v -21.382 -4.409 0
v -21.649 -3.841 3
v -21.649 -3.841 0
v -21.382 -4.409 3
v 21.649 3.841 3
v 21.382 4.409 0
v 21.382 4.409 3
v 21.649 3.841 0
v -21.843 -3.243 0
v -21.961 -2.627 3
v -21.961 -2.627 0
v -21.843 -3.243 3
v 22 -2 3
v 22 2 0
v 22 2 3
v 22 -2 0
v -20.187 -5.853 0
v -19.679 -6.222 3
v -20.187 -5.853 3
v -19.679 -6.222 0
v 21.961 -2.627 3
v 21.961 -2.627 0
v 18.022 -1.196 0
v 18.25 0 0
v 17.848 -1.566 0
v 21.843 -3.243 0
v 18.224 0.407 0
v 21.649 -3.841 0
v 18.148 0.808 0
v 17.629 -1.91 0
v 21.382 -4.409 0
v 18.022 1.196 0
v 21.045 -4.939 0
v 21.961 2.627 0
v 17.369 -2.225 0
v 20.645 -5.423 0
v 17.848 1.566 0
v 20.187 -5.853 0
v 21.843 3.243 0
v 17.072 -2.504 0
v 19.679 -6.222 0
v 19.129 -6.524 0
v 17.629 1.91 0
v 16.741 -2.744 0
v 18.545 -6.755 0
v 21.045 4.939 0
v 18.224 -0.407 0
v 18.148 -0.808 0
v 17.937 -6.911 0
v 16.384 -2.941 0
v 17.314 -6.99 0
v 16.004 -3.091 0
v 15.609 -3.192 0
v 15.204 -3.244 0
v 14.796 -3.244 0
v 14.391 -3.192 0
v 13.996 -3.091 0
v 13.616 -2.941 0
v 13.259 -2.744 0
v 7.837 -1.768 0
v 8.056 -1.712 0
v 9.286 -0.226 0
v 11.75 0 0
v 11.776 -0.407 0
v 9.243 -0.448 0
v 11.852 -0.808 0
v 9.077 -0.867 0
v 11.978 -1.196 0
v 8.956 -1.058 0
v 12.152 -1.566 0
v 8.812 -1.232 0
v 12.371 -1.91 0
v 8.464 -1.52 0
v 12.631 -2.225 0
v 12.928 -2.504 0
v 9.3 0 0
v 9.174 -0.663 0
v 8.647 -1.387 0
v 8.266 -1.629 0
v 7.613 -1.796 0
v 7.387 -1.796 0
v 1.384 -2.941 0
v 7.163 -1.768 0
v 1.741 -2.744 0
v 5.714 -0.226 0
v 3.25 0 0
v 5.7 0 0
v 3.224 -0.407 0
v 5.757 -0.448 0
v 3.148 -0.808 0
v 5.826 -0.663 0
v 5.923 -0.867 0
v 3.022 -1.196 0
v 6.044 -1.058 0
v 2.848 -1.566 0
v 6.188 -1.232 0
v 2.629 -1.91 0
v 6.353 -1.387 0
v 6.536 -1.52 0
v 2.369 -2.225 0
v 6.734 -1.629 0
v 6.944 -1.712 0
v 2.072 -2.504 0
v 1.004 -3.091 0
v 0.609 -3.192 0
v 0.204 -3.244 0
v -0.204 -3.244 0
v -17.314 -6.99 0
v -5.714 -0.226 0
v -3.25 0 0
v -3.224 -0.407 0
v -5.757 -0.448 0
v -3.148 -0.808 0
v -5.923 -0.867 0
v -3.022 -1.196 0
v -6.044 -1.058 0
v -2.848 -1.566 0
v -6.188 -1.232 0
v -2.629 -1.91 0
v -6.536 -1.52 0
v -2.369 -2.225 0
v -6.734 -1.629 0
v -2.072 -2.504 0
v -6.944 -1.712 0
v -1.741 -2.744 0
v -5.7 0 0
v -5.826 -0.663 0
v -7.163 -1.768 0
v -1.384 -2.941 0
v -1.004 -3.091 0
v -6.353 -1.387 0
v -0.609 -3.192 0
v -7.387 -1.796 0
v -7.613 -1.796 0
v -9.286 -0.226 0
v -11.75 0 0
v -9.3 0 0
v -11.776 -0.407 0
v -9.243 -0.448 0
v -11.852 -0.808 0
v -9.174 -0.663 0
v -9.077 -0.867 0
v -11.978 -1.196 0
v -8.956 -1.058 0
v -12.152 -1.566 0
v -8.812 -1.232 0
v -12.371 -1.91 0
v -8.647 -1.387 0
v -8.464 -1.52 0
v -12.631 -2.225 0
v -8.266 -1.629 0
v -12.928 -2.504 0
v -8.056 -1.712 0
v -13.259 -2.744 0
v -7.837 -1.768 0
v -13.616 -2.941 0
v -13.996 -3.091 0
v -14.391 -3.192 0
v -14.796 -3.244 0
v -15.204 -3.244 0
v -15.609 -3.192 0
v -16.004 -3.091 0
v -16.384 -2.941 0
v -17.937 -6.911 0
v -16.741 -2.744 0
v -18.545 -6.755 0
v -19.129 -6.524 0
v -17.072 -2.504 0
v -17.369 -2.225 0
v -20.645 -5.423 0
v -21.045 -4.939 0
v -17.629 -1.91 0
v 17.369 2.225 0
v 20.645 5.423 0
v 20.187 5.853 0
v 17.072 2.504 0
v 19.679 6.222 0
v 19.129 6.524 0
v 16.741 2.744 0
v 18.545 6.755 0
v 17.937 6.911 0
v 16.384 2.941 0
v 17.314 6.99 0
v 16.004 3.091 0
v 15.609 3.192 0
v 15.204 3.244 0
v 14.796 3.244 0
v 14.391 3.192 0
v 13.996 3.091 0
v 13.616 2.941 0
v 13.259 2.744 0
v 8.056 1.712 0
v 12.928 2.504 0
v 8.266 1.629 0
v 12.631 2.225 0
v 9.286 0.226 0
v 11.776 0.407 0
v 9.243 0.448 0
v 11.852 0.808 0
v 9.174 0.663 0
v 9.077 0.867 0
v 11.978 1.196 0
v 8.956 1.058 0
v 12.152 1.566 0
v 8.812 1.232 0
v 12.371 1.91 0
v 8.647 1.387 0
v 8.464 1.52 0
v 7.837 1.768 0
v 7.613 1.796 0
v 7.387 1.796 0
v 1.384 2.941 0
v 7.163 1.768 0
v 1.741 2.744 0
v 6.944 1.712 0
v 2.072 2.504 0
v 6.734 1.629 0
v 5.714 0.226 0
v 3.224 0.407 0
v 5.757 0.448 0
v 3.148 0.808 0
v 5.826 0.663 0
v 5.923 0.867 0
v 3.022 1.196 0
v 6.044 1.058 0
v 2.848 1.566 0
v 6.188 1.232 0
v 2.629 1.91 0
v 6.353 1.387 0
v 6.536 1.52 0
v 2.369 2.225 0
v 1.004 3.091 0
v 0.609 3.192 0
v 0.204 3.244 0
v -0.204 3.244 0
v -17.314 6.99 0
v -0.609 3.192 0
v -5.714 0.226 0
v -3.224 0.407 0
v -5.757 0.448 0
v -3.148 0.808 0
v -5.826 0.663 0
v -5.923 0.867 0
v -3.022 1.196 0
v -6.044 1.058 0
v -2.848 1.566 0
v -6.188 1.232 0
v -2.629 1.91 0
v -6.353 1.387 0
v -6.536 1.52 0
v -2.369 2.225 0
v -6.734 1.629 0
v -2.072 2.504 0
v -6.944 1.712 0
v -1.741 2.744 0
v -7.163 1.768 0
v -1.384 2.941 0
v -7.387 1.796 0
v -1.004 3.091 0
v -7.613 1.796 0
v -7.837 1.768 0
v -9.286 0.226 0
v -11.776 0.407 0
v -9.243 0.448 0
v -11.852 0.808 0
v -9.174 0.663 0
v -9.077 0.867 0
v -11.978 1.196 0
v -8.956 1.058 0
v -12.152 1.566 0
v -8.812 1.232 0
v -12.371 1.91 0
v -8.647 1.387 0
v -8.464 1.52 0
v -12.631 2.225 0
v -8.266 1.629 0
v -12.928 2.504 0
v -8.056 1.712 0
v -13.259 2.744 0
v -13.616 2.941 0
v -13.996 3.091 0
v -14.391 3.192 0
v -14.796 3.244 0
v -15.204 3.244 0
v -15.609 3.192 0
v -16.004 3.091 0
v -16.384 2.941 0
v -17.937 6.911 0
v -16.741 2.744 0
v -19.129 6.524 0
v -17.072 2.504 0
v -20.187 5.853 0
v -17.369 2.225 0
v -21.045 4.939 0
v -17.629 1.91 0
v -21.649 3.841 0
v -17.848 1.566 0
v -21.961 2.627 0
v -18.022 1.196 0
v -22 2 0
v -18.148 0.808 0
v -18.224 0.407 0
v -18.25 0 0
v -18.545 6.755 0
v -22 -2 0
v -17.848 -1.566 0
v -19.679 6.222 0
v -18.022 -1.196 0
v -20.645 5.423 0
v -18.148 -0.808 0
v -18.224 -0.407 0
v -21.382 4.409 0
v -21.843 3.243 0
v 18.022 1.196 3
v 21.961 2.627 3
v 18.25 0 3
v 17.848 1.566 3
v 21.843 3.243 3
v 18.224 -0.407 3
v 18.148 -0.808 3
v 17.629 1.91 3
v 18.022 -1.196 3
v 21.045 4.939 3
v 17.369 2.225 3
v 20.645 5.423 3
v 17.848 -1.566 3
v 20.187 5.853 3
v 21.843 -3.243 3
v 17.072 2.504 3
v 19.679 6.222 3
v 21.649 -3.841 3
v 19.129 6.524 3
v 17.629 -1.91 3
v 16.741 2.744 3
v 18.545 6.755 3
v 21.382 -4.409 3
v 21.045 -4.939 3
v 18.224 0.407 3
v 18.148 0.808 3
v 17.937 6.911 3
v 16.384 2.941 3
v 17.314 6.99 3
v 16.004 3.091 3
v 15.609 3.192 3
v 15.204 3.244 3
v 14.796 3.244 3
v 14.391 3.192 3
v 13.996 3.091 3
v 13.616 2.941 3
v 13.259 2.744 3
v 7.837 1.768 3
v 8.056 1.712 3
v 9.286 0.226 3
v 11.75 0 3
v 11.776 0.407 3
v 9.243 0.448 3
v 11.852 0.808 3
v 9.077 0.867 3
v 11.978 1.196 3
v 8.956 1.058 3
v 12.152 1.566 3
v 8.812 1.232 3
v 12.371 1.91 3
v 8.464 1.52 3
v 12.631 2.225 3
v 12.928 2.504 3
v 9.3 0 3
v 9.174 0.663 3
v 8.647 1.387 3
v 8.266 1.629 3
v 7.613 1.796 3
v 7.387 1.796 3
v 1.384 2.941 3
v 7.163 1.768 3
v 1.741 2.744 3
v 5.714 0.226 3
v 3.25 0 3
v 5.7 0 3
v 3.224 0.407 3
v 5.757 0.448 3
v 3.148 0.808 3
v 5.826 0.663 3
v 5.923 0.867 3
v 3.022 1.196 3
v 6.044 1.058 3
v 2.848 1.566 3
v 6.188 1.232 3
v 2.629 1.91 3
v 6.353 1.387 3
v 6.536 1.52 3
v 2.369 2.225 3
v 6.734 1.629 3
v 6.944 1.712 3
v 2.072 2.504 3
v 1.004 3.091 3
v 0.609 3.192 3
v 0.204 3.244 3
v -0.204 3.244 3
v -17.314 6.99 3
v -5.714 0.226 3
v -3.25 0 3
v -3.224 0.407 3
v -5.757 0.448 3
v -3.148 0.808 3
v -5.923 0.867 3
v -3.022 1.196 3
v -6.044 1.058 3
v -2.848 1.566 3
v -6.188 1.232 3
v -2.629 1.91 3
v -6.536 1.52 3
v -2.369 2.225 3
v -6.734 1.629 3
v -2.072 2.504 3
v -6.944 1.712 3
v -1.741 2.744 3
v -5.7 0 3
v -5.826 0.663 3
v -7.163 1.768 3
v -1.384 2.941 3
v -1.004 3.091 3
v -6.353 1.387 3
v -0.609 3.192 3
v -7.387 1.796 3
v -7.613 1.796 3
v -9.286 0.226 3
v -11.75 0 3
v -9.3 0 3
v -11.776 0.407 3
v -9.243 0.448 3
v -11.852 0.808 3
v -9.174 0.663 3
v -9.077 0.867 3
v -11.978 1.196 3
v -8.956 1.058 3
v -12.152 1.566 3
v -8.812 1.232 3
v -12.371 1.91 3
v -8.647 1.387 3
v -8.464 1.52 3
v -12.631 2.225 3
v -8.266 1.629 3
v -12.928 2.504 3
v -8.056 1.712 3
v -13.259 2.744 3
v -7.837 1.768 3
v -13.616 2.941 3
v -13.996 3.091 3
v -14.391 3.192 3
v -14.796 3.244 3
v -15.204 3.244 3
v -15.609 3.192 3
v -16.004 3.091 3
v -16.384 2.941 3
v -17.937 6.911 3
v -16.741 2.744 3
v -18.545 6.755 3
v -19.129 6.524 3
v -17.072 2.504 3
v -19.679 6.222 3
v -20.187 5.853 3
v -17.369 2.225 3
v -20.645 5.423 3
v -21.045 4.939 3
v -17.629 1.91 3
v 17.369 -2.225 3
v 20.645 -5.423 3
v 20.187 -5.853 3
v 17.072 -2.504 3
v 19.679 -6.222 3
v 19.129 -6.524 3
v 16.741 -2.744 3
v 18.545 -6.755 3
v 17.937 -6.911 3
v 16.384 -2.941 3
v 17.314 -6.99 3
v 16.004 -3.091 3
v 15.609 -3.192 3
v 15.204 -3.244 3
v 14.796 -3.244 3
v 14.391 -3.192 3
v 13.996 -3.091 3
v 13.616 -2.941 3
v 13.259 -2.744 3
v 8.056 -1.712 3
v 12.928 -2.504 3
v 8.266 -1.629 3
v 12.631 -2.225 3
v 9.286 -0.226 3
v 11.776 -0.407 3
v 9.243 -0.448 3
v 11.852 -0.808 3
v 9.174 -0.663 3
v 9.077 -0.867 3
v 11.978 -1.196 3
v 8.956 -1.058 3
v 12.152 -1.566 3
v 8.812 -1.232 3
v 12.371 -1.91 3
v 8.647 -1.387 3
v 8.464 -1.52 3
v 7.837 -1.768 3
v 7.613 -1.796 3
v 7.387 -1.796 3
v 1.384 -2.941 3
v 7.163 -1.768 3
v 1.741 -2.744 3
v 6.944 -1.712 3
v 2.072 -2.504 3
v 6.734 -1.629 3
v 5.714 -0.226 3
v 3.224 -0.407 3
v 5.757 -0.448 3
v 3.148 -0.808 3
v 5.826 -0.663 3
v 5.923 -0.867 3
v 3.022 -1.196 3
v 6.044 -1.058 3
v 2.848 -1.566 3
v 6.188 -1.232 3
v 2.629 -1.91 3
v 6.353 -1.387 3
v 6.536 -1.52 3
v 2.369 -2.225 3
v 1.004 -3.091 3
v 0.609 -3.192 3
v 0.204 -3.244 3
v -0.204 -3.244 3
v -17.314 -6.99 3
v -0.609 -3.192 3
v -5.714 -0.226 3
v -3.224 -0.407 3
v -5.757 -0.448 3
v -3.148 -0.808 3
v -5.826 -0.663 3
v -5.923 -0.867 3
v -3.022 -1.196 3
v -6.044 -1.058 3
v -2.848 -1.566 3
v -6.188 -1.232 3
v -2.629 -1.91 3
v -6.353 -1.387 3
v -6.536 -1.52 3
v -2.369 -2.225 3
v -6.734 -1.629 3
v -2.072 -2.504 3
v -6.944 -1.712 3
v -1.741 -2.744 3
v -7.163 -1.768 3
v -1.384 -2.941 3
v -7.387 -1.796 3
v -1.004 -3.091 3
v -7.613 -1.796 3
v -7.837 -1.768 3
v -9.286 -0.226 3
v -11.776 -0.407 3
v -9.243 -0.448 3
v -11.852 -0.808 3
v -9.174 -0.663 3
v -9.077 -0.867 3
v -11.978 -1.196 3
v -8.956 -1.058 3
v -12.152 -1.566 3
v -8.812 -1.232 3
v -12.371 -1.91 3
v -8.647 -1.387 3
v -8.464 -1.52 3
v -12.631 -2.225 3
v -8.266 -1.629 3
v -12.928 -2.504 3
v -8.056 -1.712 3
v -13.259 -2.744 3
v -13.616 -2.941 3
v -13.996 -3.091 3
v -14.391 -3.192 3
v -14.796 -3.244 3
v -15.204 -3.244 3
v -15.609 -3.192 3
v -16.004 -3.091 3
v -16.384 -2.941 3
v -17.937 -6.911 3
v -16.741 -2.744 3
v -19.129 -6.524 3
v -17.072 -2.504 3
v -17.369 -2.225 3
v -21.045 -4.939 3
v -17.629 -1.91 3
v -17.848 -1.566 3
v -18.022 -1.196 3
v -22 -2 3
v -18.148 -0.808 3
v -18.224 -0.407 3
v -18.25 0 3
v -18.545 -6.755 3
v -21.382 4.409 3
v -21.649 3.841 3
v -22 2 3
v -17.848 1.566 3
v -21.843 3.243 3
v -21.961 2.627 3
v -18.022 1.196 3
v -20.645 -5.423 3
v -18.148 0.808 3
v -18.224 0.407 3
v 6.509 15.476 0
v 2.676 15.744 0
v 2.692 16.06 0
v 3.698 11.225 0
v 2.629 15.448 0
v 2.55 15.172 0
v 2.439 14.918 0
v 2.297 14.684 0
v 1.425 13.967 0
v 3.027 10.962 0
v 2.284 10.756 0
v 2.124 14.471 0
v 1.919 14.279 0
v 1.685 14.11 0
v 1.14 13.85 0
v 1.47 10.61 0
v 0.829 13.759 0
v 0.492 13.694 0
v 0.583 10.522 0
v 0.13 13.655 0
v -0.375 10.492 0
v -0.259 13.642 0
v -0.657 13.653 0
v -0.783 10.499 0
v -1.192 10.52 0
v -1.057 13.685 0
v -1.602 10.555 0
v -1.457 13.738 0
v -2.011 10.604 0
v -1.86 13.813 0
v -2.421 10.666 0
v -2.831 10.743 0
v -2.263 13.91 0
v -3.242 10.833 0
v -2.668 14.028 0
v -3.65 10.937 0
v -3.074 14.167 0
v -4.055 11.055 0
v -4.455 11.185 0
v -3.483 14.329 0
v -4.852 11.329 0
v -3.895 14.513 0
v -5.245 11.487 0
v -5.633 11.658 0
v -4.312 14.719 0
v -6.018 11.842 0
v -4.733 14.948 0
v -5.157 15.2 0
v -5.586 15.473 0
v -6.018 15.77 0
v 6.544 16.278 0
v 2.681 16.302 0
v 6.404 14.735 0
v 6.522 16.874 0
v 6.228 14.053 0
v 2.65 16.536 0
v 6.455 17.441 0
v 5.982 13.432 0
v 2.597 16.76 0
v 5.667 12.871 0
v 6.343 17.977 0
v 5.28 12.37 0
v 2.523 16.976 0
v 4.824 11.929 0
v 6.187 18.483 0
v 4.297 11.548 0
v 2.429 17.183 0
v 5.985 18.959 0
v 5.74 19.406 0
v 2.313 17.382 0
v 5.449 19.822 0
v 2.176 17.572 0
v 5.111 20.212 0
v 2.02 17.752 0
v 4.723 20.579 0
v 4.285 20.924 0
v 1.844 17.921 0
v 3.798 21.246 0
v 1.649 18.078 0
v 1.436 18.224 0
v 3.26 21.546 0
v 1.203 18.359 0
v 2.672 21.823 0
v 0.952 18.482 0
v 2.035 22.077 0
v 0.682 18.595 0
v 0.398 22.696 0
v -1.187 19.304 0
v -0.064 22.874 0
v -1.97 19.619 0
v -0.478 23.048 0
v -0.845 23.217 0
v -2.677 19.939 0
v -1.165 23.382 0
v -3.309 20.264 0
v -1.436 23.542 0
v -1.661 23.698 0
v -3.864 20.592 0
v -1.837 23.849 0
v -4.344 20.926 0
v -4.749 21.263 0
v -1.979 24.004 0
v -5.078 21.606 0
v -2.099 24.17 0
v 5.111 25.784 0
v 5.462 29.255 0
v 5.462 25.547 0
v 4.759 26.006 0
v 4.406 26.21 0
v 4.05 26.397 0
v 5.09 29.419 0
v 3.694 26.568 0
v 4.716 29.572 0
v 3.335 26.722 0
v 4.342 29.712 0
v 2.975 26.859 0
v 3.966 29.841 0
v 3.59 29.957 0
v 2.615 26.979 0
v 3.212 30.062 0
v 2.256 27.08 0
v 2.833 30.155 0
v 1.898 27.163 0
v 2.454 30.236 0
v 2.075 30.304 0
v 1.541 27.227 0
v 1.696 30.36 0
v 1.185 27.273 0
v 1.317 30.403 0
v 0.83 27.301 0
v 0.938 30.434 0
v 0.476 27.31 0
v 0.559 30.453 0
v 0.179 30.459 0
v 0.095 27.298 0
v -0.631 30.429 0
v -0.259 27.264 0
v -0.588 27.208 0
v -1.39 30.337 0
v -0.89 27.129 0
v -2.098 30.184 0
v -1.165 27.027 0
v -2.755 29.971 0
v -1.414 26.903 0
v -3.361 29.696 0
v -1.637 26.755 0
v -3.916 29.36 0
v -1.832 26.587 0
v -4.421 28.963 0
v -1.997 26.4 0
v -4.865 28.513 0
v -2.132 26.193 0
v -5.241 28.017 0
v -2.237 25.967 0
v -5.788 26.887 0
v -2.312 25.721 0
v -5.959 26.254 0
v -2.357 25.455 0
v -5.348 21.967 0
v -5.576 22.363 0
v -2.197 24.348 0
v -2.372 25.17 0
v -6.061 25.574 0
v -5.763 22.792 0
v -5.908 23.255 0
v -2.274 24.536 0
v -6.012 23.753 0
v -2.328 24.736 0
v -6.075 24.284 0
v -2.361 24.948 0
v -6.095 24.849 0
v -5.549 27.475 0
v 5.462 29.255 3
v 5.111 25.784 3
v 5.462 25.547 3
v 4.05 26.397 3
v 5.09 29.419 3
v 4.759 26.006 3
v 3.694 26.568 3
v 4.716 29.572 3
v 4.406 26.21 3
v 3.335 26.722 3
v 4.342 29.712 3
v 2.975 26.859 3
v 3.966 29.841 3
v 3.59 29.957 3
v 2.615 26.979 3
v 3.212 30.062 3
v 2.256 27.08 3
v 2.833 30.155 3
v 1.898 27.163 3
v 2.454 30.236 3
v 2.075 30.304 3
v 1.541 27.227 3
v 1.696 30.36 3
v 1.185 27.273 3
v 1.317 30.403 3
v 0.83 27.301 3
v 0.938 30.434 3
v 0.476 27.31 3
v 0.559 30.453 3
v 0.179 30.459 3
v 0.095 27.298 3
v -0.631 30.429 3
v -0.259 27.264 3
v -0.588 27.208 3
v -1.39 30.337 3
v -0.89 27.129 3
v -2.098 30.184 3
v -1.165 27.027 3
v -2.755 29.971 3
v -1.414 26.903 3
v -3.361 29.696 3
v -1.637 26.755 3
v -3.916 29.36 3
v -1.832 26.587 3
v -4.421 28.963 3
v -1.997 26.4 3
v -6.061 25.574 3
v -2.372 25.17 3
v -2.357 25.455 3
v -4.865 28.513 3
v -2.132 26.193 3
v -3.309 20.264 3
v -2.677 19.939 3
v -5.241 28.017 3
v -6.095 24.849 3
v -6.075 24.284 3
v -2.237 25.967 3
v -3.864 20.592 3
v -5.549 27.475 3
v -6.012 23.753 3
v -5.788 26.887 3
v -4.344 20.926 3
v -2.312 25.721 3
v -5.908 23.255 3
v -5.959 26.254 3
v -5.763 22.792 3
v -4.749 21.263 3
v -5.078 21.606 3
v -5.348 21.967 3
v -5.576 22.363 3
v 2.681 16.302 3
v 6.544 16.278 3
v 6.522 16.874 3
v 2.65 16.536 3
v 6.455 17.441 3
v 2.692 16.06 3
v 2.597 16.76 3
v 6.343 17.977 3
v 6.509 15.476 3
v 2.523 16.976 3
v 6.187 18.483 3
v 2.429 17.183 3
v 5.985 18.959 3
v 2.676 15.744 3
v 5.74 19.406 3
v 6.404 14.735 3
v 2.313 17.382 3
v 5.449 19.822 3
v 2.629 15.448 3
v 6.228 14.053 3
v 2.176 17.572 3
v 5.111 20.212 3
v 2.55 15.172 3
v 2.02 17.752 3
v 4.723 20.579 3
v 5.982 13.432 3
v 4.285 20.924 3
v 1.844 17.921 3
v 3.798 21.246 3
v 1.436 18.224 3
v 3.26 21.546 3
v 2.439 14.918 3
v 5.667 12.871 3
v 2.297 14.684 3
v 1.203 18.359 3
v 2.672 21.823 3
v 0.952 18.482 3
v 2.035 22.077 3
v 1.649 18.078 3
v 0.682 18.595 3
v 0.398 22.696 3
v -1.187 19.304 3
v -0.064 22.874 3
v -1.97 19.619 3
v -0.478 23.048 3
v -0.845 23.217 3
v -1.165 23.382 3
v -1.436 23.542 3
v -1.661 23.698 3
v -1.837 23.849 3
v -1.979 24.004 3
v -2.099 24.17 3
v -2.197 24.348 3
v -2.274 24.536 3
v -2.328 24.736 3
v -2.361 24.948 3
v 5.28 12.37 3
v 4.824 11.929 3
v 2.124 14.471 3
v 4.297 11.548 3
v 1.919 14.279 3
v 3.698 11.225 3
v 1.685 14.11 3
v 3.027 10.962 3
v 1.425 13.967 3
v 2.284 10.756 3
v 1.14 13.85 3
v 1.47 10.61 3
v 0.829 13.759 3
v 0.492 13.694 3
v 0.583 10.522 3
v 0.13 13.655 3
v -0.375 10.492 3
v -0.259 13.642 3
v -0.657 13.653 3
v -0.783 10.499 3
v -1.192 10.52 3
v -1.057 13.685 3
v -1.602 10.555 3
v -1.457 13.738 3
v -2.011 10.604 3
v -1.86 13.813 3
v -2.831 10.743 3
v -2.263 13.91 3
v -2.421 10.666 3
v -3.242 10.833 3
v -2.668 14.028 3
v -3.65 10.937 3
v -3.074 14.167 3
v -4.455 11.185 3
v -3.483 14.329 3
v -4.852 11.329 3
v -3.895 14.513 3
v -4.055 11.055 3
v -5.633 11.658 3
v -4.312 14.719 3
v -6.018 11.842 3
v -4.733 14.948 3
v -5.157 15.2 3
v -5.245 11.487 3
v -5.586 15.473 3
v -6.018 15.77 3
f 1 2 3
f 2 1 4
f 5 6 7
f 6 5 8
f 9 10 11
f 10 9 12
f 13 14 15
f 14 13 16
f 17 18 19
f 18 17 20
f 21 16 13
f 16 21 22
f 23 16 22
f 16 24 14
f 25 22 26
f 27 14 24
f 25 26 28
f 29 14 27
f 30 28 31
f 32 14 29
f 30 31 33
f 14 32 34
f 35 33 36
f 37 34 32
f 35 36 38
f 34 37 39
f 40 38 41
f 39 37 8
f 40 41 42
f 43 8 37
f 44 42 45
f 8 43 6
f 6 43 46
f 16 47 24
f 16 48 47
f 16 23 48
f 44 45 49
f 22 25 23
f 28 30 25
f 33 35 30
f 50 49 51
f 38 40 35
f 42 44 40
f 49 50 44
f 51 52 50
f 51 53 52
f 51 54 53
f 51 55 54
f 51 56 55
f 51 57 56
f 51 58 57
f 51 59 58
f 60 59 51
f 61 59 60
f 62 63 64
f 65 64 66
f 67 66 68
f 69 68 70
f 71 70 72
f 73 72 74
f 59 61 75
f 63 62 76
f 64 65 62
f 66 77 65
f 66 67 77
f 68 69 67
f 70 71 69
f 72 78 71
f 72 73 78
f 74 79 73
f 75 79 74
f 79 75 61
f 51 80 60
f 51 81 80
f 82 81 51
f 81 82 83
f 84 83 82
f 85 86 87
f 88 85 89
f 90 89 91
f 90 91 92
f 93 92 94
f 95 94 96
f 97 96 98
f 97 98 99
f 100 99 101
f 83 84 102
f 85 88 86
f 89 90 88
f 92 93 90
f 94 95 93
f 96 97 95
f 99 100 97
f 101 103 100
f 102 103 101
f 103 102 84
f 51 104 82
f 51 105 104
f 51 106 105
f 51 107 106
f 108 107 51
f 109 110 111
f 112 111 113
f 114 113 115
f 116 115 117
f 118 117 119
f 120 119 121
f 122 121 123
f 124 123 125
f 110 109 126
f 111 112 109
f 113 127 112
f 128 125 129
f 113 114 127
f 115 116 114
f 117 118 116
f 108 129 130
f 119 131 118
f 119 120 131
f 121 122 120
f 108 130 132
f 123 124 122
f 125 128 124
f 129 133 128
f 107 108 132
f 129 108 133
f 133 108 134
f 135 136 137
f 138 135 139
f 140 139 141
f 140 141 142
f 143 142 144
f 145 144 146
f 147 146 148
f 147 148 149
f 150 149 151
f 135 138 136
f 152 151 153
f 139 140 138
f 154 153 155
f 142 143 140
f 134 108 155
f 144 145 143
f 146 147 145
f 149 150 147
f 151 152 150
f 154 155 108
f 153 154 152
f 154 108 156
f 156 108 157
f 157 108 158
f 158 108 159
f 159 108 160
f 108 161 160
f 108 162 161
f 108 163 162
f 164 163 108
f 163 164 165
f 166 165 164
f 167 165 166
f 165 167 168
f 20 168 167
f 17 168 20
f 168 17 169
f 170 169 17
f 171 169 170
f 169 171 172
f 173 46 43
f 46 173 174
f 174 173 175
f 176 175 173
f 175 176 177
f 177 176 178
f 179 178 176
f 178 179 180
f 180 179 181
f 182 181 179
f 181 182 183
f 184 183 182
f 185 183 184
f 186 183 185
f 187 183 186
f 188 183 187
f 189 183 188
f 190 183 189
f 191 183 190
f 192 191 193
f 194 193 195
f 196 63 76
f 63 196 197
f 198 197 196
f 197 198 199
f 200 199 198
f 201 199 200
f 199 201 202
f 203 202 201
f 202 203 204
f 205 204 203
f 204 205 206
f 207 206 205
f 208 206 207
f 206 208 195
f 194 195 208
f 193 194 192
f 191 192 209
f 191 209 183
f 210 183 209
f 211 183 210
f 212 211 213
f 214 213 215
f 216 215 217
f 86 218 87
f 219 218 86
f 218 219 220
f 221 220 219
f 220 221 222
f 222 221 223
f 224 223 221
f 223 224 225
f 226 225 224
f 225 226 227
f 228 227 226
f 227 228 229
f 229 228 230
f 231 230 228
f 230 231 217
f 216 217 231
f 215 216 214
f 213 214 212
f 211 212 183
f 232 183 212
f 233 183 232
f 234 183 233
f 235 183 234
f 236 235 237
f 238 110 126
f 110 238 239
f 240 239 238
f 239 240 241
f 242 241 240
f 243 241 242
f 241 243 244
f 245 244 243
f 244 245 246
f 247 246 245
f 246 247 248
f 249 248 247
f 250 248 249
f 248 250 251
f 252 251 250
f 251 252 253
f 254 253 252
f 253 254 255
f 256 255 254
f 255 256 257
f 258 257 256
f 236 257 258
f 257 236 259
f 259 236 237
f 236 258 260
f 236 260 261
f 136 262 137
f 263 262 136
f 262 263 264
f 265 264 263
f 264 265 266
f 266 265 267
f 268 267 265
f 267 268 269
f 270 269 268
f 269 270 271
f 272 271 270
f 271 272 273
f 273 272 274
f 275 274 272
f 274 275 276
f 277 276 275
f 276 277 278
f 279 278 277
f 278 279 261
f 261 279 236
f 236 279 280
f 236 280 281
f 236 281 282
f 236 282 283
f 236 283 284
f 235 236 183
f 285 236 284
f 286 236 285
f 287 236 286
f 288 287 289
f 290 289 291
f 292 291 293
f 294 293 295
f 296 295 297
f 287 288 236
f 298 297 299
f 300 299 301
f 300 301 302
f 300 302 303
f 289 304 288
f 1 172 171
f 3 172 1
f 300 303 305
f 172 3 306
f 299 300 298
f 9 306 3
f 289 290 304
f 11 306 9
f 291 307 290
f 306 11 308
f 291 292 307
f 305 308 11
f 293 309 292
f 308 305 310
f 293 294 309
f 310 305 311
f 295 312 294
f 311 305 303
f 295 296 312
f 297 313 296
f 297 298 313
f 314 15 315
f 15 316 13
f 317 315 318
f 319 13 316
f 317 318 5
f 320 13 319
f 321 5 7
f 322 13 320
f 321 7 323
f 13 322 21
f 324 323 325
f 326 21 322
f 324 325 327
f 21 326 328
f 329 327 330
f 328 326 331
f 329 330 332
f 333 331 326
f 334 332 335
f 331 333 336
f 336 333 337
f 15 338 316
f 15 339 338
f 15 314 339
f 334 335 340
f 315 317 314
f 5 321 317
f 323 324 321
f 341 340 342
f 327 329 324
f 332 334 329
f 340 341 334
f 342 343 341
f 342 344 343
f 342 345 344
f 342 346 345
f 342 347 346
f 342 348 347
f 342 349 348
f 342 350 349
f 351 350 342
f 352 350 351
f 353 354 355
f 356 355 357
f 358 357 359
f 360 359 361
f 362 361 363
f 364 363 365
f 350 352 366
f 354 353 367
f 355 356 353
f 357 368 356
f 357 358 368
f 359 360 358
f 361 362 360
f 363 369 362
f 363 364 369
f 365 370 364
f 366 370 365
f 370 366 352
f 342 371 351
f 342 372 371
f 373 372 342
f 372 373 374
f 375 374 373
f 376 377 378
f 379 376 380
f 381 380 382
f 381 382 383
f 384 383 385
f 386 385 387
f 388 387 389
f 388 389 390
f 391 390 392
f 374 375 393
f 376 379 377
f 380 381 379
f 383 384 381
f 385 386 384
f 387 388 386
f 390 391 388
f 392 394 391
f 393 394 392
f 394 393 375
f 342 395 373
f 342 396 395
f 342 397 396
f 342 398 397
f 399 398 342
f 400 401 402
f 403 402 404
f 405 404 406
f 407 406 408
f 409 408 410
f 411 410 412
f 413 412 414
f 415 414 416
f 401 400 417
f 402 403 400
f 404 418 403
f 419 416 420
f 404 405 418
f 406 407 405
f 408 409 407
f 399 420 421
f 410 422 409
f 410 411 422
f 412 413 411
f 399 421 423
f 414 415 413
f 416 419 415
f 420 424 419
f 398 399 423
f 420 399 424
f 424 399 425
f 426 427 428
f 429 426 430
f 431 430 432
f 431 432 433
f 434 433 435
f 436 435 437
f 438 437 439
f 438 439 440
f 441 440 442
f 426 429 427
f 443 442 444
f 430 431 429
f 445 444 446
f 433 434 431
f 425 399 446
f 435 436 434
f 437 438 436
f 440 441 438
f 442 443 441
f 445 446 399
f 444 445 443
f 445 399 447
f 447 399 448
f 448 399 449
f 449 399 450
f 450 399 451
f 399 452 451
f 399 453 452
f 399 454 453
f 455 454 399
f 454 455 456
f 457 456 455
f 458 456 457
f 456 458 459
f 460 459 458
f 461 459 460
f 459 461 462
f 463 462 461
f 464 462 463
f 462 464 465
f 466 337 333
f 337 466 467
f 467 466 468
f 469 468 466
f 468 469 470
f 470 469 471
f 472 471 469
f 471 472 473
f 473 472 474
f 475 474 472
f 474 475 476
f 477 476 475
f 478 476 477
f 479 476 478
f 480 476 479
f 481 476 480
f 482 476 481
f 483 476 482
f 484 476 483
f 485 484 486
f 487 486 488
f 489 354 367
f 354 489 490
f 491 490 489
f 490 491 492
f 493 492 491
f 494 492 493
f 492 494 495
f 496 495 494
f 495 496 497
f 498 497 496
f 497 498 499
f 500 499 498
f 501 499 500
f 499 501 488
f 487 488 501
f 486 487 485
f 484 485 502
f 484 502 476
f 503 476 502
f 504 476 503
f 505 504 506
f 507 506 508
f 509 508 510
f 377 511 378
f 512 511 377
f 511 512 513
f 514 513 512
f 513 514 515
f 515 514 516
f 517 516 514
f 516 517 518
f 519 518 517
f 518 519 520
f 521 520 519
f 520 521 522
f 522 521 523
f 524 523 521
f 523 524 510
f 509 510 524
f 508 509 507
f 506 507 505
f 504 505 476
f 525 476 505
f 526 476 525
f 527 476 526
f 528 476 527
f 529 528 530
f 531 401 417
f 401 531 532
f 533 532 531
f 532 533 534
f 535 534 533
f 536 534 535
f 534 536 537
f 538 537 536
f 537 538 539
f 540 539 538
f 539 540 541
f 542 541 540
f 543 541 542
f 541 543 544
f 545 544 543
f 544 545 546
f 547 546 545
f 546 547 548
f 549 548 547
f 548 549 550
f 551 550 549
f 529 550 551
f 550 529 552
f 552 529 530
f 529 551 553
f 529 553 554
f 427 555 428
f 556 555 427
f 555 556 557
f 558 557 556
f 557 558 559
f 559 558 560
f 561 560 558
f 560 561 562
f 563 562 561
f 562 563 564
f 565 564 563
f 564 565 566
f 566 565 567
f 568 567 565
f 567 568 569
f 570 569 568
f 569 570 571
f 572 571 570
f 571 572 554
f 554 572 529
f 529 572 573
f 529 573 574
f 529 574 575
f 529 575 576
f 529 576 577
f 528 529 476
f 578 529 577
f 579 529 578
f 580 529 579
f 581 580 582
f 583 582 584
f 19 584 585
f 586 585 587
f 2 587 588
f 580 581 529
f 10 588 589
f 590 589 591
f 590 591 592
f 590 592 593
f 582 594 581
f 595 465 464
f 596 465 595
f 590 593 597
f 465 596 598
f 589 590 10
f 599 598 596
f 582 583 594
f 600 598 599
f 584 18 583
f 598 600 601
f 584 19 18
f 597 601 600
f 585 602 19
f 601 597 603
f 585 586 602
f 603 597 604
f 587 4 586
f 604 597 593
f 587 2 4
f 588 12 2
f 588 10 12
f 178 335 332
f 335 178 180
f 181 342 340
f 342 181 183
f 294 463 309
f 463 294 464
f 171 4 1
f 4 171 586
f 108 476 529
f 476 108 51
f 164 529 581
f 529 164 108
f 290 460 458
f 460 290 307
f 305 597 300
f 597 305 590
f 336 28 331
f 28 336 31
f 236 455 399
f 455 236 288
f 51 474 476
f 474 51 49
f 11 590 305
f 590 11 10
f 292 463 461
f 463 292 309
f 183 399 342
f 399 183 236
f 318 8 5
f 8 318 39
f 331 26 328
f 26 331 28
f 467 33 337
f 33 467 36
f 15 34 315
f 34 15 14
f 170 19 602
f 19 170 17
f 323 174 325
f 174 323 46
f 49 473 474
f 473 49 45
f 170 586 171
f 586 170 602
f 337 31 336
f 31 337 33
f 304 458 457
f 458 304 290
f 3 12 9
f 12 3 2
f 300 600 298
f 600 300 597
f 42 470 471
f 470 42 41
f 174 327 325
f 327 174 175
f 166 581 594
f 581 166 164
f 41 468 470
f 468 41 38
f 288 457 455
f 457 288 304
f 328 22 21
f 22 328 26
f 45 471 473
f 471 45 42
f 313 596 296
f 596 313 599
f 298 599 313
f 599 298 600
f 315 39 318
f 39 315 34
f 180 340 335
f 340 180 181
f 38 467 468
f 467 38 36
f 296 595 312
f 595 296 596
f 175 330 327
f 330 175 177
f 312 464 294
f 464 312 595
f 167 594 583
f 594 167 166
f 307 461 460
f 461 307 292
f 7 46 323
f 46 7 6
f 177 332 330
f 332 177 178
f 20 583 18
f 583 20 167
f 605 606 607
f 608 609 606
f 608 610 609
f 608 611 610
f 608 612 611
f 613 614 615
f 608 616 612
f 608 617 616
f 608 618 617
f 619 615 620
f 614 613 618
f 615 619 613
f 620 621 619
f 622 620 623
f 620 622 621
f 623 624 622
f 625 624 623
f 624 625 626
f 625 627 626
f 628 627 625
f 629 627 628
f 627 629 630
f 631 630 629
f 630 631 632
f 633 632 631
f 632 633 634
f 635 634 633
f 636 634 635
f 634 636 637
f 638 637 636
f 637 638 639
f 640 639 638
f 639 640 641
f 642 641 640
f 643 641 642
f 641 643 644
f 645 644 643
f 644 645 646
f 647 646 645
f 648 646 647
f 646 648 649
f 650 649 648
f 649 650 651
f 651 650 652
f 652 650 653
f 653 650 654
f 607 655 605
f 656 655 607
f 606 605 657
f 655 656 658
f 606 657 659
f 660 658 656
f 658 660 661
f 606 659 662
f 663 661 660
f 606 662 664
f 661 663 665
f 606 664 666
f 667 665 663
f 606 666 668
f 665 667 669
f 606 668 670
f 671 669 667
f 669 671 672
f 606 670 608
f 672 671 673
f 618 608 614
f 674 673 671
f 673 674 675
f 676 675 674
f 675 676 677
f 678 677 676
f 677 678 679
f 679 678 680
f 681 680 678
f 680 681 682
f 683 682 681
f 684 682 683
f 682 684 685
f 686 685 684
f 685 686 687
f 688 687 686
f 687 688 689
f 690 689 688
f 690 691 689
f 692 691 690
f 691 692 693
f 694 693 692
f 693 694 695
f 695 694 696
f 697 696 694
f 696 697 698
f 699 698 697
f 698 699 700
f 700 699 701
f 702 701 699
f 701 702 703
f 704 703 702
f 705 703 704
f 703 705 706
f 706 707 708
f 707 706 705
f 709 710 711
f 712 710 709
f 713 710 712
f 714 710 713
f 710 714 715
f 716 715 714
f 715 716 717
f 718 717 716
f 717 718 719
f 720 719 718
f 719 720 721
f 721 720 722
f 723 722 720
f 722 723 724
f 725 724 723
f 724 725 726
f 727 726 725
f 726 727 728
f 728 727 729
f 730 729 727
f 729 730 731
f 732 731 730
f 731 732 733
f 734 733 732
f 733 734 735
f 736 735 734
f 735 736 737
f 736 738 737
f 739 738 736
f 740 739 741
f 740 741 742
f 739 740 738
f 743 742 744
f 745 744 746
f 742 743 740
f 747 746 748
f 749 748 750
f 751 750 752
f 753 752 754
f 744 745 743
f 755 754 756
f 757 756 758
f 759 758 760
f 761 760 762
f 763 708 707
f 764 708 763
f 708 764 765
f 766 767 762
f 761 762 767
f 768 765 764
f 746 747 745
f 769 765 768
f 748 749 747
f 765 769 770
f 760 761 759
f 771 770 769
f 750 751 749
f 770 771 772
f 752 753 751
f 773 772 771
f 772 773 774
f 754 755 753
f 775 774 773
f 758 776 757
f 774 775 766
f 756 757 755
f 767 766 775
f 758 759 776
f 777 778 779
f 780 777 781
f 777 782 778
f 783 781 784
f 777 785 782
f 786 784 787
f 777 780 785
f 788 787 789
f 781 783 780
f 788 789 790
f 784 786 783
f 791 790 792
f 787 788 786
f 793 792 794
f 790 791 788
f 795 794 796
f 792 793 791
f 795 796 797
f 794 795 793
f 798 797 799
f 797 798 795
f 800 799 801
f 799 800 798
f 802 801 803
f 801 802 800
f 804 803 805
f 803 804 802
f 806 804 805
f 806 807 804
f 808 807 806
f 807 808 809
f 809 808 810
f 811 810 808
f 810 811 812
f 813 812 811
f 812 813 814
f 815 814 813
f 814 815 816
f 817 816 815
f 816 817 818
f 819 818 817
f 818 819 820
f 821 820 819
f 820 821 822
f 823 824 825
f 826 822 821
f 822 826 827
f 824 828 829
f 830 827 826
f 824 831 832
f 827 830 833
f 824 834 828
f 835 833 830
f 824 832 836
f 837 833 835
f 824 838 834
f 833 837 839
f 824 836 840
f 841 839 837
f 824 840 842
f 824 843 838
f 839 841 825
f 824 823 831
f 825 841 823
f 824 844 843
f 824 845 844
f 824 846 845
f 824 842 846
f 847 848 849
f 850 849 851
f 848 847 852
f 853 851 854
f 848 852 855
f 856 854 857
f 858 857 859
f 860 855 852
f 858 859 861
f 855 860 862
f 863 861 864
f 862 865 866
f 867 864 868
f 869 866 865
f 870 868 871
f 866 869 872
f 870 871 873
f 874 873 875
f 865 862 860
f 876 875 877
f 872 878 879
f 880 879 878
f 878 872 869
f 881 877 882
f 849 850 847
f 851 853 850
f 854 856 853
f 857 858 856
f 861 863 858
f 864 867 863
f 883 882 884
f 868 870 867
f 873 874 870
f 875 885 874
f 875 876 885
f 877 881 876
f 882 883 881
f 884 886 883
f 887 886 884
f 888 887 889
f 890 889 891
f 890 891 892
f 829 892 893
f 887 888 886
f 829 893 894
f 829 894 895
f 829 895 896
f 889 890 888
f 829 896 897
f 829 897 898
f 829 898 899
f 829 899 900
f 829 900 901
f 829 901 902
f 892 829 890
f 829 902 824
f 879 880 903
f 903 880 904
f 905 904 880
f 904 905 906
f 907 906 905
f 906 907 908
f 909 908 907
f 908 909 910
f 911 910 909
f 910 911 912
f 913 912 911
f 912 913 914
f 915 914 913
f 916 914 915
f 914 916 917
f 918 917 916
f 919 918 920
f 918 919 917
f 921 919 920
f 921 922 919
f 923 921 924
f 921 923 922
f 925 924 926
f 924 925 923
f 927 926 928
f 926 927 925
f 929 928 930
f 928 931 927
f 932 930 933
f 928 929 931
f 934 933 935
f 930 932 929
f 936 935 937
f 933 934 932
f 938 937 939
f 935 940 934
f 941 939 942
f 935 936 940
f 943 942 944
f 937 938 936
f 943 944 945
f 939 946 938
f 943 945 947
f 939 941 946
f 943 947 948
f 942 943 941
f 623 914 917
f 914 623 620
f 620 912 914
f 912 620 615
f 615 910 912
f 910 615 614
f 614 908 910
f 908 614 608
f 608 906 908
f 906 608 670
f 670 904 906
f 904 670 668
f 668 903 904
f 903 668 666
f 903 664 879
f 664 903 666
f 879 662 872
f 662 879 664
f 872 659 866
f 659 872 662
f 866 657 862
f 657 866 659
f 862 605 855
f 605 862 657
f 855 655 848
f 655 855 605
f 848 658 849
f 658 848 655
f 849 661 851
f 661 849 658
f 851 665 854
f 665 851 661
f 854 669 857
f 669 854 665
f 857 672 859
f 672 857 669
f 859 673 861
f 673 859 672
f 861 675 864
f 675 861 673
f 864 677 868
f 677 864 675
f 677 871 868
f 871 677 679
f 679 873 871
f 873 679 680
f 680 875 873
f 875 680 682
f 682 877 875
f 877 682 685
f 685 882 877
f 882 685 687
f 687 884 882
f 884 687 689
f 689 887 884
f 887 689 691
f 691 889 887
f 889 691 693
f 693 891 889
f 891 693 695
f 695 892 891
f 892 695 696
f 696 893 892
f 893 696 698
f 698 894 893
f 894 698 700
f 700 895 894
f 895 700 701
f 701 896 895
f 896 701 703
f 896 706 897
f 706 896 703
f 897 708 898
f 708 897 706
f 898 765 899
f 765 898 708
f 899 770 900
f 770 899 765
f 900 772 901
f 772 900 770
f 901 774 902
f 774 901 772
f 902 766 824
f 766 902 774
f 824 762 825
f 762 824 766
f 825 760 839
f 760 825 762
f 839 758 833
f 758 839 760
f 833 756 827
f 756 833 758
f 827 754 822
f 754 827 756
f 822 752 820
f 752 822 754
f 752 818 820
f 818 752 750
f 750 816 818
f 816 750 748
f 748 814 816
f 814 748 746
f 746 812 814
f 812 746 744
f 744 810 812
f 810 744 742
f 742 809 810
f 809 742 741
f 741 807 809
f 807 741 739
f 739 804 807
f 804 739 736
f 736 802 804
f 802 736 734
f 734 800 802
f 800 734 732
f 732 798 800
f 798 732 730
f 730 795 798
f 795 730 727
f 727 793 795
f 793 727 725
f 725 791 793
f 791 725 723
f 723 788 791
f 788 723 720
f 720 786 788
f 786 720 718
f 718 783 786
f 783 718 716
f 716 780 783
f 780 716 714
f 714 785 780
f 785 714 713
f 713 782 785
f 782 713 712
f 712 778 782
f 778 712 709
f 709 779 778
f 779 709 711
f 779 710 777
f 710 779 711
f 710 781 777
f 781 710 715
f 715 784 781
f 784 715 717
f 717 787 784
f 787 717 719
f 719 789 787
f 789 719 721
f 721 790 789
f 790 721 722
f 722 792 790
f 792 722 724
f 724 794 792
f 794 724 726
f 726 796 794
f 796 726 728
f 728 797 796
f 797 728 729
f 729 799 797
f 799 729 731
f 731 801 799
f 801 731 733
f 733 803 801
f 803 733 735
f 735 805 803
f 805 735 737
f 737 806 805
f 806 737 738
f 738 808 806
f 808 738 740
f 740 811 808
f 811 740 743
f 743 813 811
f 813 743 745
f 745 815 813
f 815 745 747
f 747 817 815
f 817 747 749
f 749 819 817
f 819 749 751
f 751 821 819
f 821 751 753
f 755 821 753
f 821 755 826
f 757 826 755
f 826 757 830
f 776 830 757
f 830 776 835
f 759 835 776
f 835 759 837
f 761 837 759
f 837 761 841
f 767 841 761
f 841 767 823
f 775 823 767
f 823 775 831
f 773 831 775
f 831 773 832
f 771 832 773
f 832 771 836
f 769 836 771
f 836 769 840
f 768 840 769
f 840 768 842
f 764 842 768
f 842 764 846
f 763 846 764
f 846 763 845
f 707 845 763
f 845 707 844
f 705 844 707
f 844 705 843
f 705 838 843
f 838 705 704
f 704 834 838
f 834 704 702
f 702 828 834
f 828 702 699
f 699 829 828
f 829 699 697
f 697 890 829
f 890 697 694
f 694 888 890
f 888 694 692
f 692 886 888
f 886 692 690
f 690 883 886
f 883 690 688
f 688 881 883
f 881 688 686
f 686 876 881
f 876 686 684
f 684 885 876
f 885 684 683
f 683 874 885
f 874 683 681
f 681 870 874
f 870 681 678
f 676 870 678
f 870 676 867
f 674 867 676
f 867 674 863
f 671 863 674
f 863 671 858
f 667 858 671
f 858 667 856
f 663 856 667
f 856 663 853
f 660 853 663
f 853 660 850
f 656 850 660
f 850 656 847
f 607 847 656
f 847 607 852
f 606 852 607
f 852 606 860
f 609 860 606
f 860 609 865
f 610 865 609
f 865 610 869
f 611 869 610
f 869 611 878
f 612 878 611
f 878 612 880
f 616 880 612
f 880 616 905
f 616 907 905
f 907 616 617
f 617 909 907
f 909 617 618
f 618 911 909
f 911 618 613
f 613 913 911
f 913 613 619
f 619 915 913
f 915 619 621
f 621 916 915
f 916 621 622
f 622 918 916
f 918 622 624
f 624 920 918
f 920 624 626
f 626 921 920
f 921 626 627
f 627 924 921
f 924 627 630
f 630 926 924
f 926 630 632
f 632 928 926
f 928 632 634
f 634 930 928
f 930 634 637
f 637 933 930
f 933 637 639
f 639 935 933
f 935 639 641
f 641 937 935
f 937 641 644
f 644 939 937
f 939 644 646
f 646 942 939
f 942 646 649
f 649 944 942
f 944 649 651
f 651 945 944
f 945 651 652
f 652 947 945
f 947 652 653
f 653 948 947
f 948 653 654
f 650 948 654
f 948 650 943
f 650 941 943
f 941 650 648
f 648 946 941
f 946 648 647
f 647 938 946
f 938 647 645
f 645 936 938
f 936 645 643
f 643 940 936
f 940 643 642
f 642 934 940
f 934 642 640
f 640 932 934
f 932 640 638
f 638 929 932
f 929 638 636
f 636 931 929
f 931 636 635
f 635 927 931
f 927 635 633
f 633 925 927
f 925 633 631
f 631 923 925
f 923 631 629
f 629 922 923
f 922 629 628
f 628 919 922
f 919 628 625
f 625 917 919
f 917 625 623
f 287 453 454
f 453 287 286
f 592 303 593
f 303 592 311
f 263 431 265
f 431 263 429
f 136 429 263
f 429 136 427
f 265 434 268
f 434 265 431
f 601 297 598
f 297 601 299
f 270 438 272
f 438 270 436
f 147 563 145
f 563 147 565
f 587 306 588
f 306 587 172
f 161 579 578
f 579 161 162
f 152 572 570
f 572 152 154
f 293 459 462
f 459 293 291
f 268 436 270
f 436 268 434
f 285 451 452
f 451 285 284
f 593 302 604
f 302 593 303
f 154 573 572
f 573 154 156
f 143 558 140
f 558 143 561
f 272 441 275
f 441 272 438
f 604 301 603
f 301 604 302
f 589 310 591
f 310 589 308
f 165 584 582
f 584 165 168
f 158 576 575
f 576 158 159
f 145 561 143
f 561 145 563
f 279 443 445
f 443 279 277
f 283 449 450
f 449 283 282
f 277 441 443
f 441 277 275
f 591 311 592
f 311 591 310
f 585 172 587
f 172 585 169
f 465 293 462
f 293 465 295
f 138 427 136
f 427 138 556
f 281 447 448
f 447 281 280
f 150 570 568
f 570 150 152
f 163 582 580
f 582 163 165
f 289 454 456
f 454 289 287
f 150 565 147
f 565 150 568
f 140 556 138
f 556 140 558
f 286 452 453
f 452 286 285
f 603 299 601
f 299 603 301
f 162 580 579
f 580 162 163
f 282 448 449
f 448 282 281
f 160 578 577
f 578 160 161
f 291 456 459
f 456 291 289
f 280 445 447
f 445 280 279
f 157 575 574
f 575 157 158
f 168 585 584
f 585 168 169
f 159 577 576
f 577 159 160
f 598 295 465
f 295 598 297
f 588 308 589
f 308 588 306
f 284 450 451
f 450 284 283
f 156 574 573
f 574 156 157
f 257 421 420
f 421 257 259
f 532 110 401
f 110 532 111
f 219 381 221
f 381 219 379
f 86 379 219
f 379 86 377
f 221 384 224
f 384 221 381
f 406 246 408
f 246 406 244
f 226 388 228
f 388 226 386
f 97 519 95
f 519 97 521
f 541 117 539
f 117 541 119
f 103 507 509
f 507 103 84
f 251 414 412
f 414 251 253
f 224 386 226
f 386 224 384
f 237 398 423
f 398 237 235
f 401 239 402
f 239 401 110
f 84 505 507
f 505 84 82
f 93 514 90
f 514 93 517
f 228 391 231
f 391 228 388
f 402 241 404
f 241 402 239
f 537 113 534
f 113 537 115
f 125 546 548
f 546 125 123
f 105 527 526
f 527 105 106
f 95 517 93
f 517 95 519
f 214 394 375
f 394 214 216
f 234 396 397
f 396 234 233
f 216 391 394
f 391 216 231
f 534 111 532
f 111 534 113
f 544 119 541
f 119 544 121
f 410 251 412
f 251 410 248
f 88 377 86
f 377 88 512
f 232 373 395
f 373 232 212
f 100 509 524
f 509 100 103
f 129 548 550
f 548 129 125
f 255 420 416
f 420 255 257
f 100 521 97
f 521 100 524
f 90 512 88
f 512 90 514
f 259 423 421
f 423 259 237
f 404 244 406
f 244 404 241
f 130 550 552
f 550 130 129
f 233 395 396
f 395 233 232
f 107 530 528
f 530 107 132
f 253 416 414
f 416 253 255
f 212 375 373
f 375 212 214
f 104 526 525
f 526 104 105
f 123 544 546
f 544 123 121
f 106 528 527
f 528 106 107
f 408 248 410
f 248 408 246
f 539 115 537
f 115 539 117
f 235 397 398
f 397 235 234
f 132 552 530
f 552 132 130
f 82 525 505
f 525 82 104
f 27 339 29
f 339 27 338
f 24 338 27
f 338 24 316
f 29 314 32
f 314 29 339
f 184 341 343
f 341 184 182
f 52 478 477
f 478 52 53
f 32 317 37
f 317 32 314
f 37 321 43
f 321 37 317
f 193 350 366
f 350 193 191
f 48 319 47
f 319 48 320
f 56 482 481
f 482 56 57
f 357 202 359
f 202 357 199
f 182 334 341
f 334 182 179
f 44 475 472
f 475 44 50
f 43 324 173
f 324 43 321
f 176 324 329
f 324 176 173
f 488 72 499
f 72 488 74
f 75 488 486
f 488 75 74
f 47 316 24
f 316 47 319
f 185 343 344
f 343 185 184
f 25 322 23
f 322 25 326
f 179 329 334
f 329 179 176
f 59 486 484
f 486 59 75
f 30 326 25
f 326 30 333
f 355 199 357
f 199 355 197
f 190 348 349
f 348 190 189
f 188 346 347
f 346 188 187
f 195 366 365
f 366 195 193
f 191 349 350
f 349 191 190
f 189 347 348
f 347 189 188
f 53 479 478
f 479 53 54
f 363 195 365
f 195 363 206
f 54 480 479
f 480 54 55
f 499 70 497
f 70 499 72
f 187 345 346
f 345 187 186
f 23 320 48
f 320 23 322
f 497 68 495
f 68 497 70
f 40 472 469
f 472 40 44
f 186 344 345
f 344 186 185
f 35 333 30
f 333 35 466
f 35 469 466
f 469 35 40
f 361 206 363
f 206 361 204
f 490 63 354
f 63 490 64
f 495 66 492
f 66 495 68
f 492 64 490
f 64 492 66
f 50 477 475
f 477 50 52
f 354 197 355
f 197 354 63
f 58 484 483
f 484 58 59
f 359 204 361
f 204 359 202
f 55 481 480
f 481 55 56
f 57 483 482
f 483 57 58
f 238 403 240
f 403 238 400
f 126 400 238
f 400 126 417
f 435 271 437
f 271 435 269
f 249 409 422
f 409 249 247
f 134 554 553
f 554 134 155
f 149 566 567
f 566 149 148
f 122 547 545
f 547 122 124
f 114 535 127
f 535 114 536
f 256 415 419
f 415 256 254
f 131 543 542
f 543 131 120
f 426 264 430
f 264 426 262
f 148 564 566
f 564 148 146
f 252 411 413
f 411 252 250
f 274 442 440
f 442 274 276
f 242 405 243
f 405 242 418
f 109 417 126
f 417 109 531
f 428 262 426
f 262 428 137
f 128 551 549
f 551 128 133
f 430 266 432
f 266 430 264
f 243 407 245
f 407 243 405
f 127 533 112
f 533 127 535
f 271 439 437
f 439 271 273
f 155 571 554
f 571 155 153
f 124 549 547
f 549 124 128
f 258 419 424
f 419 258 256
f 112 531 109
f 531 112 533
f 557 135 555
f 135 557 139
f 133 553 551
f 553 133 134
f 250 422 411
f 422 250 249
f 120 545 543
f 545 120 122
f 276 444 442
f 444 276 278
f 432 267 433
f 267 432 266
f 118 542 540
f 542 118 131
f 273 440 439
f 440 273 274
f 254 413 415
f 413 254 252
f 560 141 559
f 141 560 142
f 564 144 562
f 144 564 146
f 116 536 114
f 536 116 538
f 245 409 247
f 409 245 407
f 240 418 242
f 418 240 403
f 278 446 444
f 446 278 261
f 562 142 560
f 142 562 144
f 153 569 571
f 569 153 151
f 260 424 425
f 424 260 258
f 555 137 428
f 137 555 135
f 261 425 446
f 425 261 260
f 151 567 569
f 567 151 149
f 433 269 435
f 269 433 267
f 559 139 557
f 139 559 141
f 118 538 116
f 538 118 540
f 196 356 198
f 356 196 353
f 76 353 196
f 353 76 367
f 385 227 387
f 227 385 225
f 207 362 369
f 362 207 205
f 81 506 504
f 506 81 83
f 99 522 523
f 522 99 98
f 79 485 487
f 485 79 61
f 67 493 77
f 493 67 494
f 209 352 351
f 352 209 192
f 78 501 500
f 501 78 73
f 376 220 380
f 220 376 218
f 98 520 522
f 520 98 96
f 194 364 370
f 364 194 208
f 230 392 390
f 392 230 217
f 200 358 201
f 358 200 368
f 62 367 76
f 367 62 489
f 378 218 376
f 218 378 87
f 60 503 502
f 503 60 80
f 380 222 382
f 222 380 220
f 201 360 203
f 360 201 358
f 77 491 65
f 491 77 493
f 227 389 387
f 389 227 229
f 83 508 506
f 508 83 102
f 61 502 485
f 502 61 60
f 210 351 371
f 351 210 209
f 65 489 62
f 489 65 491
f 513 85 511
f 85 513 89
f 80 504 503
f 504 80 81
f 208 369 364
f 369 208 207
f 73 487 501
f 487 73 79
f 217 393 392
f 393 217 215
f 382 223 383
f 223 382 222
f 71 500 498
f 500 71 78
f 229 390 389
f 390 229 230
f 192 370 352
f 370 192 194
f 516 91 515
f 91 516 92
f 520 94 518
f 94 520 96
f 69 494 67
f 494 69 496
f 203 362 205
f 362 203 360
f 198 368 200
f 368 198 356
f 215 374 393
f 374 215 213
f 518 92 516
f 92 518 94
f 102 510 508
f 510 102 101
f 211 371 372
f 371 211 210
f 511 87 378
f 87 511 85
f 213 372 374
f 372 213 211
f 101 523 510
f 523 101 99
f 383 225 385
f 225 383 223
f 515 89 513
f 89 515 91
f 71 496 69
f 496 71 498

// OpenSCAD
$fn = 50;


difference() {
	union() {
		hull() {
			translate(v = [-17.0000000000, 2.0000000000, 0]) {
				cylinder(h = 3, r = 5);
			}
			translate(v = [17.0000000000, 2.0000000000, 0]) {
				cylinder(h = 3, r = 5);
			}
			translate(v = [-17.0000000000, -2.0000000000, 0]) {
				cylinder(h = 3, r = 5);
			}
			translate(v = [17.0000000000, -2.0000000000, 0]) {
				cylinder(h = 3, r = 5);
			}
		}
		translate(v = [0, 30.0000000000, 0]) {
			linear_extrude(height = 3) {
				text(font = "DejaVu Sans Mono:style=Bold", halign = "center", size = 19.0000000000, text = "S", valign = "top");
			}
		}
	}
	union() {
		translate(v = [-15.0000000000, 0.0000000000, 0]) {
			translate(v = [0, 0, -100]) {
				cylinder(h = 200, r = 3.2500000000);
			}
		}
		translate(v = [0, 0, -100]) {
			cylinder(h = 200, r = 3.2500000000);
		}
		translate(v = [15.0000000000, 0.0000000000, 0]) {
			translate(v = [0, 0, -100]) {
				cylinder(h = 200, r = 3.2500000000);
			}
		}
		translate(v = [-15.0000000000, 0.0000000000, 0]) {
			translate(v = [0, 0, -100]) {
				cylinder(h = 200, r = 1.8000000000);
			}
		}
		translate(v = [-7.5000000000, 0.0000000000, 0]) {
			translate(v = [0, 0, -100]) {
				cylinder(h = 200, r = 1.8000000000);
			}
		}
		translate(v = [0, 0, -100]) {
			cylinder(h = 200, r = 1.8000000000);
		}
		translate(v = [7.5000000000, 0.0000000000, 0]) {
			translate(v = [0, 0, -100]) {
				cylinder(h = 200, r = 1.8000000000);
			}
		}
		translate(v = [15.0000000000, 0.0000000000, 0]) {
			translate(v = [0, 0, -100]) {
				cylinder(h = 200, r = 1.8000000000);
			}
		}
	}
}
